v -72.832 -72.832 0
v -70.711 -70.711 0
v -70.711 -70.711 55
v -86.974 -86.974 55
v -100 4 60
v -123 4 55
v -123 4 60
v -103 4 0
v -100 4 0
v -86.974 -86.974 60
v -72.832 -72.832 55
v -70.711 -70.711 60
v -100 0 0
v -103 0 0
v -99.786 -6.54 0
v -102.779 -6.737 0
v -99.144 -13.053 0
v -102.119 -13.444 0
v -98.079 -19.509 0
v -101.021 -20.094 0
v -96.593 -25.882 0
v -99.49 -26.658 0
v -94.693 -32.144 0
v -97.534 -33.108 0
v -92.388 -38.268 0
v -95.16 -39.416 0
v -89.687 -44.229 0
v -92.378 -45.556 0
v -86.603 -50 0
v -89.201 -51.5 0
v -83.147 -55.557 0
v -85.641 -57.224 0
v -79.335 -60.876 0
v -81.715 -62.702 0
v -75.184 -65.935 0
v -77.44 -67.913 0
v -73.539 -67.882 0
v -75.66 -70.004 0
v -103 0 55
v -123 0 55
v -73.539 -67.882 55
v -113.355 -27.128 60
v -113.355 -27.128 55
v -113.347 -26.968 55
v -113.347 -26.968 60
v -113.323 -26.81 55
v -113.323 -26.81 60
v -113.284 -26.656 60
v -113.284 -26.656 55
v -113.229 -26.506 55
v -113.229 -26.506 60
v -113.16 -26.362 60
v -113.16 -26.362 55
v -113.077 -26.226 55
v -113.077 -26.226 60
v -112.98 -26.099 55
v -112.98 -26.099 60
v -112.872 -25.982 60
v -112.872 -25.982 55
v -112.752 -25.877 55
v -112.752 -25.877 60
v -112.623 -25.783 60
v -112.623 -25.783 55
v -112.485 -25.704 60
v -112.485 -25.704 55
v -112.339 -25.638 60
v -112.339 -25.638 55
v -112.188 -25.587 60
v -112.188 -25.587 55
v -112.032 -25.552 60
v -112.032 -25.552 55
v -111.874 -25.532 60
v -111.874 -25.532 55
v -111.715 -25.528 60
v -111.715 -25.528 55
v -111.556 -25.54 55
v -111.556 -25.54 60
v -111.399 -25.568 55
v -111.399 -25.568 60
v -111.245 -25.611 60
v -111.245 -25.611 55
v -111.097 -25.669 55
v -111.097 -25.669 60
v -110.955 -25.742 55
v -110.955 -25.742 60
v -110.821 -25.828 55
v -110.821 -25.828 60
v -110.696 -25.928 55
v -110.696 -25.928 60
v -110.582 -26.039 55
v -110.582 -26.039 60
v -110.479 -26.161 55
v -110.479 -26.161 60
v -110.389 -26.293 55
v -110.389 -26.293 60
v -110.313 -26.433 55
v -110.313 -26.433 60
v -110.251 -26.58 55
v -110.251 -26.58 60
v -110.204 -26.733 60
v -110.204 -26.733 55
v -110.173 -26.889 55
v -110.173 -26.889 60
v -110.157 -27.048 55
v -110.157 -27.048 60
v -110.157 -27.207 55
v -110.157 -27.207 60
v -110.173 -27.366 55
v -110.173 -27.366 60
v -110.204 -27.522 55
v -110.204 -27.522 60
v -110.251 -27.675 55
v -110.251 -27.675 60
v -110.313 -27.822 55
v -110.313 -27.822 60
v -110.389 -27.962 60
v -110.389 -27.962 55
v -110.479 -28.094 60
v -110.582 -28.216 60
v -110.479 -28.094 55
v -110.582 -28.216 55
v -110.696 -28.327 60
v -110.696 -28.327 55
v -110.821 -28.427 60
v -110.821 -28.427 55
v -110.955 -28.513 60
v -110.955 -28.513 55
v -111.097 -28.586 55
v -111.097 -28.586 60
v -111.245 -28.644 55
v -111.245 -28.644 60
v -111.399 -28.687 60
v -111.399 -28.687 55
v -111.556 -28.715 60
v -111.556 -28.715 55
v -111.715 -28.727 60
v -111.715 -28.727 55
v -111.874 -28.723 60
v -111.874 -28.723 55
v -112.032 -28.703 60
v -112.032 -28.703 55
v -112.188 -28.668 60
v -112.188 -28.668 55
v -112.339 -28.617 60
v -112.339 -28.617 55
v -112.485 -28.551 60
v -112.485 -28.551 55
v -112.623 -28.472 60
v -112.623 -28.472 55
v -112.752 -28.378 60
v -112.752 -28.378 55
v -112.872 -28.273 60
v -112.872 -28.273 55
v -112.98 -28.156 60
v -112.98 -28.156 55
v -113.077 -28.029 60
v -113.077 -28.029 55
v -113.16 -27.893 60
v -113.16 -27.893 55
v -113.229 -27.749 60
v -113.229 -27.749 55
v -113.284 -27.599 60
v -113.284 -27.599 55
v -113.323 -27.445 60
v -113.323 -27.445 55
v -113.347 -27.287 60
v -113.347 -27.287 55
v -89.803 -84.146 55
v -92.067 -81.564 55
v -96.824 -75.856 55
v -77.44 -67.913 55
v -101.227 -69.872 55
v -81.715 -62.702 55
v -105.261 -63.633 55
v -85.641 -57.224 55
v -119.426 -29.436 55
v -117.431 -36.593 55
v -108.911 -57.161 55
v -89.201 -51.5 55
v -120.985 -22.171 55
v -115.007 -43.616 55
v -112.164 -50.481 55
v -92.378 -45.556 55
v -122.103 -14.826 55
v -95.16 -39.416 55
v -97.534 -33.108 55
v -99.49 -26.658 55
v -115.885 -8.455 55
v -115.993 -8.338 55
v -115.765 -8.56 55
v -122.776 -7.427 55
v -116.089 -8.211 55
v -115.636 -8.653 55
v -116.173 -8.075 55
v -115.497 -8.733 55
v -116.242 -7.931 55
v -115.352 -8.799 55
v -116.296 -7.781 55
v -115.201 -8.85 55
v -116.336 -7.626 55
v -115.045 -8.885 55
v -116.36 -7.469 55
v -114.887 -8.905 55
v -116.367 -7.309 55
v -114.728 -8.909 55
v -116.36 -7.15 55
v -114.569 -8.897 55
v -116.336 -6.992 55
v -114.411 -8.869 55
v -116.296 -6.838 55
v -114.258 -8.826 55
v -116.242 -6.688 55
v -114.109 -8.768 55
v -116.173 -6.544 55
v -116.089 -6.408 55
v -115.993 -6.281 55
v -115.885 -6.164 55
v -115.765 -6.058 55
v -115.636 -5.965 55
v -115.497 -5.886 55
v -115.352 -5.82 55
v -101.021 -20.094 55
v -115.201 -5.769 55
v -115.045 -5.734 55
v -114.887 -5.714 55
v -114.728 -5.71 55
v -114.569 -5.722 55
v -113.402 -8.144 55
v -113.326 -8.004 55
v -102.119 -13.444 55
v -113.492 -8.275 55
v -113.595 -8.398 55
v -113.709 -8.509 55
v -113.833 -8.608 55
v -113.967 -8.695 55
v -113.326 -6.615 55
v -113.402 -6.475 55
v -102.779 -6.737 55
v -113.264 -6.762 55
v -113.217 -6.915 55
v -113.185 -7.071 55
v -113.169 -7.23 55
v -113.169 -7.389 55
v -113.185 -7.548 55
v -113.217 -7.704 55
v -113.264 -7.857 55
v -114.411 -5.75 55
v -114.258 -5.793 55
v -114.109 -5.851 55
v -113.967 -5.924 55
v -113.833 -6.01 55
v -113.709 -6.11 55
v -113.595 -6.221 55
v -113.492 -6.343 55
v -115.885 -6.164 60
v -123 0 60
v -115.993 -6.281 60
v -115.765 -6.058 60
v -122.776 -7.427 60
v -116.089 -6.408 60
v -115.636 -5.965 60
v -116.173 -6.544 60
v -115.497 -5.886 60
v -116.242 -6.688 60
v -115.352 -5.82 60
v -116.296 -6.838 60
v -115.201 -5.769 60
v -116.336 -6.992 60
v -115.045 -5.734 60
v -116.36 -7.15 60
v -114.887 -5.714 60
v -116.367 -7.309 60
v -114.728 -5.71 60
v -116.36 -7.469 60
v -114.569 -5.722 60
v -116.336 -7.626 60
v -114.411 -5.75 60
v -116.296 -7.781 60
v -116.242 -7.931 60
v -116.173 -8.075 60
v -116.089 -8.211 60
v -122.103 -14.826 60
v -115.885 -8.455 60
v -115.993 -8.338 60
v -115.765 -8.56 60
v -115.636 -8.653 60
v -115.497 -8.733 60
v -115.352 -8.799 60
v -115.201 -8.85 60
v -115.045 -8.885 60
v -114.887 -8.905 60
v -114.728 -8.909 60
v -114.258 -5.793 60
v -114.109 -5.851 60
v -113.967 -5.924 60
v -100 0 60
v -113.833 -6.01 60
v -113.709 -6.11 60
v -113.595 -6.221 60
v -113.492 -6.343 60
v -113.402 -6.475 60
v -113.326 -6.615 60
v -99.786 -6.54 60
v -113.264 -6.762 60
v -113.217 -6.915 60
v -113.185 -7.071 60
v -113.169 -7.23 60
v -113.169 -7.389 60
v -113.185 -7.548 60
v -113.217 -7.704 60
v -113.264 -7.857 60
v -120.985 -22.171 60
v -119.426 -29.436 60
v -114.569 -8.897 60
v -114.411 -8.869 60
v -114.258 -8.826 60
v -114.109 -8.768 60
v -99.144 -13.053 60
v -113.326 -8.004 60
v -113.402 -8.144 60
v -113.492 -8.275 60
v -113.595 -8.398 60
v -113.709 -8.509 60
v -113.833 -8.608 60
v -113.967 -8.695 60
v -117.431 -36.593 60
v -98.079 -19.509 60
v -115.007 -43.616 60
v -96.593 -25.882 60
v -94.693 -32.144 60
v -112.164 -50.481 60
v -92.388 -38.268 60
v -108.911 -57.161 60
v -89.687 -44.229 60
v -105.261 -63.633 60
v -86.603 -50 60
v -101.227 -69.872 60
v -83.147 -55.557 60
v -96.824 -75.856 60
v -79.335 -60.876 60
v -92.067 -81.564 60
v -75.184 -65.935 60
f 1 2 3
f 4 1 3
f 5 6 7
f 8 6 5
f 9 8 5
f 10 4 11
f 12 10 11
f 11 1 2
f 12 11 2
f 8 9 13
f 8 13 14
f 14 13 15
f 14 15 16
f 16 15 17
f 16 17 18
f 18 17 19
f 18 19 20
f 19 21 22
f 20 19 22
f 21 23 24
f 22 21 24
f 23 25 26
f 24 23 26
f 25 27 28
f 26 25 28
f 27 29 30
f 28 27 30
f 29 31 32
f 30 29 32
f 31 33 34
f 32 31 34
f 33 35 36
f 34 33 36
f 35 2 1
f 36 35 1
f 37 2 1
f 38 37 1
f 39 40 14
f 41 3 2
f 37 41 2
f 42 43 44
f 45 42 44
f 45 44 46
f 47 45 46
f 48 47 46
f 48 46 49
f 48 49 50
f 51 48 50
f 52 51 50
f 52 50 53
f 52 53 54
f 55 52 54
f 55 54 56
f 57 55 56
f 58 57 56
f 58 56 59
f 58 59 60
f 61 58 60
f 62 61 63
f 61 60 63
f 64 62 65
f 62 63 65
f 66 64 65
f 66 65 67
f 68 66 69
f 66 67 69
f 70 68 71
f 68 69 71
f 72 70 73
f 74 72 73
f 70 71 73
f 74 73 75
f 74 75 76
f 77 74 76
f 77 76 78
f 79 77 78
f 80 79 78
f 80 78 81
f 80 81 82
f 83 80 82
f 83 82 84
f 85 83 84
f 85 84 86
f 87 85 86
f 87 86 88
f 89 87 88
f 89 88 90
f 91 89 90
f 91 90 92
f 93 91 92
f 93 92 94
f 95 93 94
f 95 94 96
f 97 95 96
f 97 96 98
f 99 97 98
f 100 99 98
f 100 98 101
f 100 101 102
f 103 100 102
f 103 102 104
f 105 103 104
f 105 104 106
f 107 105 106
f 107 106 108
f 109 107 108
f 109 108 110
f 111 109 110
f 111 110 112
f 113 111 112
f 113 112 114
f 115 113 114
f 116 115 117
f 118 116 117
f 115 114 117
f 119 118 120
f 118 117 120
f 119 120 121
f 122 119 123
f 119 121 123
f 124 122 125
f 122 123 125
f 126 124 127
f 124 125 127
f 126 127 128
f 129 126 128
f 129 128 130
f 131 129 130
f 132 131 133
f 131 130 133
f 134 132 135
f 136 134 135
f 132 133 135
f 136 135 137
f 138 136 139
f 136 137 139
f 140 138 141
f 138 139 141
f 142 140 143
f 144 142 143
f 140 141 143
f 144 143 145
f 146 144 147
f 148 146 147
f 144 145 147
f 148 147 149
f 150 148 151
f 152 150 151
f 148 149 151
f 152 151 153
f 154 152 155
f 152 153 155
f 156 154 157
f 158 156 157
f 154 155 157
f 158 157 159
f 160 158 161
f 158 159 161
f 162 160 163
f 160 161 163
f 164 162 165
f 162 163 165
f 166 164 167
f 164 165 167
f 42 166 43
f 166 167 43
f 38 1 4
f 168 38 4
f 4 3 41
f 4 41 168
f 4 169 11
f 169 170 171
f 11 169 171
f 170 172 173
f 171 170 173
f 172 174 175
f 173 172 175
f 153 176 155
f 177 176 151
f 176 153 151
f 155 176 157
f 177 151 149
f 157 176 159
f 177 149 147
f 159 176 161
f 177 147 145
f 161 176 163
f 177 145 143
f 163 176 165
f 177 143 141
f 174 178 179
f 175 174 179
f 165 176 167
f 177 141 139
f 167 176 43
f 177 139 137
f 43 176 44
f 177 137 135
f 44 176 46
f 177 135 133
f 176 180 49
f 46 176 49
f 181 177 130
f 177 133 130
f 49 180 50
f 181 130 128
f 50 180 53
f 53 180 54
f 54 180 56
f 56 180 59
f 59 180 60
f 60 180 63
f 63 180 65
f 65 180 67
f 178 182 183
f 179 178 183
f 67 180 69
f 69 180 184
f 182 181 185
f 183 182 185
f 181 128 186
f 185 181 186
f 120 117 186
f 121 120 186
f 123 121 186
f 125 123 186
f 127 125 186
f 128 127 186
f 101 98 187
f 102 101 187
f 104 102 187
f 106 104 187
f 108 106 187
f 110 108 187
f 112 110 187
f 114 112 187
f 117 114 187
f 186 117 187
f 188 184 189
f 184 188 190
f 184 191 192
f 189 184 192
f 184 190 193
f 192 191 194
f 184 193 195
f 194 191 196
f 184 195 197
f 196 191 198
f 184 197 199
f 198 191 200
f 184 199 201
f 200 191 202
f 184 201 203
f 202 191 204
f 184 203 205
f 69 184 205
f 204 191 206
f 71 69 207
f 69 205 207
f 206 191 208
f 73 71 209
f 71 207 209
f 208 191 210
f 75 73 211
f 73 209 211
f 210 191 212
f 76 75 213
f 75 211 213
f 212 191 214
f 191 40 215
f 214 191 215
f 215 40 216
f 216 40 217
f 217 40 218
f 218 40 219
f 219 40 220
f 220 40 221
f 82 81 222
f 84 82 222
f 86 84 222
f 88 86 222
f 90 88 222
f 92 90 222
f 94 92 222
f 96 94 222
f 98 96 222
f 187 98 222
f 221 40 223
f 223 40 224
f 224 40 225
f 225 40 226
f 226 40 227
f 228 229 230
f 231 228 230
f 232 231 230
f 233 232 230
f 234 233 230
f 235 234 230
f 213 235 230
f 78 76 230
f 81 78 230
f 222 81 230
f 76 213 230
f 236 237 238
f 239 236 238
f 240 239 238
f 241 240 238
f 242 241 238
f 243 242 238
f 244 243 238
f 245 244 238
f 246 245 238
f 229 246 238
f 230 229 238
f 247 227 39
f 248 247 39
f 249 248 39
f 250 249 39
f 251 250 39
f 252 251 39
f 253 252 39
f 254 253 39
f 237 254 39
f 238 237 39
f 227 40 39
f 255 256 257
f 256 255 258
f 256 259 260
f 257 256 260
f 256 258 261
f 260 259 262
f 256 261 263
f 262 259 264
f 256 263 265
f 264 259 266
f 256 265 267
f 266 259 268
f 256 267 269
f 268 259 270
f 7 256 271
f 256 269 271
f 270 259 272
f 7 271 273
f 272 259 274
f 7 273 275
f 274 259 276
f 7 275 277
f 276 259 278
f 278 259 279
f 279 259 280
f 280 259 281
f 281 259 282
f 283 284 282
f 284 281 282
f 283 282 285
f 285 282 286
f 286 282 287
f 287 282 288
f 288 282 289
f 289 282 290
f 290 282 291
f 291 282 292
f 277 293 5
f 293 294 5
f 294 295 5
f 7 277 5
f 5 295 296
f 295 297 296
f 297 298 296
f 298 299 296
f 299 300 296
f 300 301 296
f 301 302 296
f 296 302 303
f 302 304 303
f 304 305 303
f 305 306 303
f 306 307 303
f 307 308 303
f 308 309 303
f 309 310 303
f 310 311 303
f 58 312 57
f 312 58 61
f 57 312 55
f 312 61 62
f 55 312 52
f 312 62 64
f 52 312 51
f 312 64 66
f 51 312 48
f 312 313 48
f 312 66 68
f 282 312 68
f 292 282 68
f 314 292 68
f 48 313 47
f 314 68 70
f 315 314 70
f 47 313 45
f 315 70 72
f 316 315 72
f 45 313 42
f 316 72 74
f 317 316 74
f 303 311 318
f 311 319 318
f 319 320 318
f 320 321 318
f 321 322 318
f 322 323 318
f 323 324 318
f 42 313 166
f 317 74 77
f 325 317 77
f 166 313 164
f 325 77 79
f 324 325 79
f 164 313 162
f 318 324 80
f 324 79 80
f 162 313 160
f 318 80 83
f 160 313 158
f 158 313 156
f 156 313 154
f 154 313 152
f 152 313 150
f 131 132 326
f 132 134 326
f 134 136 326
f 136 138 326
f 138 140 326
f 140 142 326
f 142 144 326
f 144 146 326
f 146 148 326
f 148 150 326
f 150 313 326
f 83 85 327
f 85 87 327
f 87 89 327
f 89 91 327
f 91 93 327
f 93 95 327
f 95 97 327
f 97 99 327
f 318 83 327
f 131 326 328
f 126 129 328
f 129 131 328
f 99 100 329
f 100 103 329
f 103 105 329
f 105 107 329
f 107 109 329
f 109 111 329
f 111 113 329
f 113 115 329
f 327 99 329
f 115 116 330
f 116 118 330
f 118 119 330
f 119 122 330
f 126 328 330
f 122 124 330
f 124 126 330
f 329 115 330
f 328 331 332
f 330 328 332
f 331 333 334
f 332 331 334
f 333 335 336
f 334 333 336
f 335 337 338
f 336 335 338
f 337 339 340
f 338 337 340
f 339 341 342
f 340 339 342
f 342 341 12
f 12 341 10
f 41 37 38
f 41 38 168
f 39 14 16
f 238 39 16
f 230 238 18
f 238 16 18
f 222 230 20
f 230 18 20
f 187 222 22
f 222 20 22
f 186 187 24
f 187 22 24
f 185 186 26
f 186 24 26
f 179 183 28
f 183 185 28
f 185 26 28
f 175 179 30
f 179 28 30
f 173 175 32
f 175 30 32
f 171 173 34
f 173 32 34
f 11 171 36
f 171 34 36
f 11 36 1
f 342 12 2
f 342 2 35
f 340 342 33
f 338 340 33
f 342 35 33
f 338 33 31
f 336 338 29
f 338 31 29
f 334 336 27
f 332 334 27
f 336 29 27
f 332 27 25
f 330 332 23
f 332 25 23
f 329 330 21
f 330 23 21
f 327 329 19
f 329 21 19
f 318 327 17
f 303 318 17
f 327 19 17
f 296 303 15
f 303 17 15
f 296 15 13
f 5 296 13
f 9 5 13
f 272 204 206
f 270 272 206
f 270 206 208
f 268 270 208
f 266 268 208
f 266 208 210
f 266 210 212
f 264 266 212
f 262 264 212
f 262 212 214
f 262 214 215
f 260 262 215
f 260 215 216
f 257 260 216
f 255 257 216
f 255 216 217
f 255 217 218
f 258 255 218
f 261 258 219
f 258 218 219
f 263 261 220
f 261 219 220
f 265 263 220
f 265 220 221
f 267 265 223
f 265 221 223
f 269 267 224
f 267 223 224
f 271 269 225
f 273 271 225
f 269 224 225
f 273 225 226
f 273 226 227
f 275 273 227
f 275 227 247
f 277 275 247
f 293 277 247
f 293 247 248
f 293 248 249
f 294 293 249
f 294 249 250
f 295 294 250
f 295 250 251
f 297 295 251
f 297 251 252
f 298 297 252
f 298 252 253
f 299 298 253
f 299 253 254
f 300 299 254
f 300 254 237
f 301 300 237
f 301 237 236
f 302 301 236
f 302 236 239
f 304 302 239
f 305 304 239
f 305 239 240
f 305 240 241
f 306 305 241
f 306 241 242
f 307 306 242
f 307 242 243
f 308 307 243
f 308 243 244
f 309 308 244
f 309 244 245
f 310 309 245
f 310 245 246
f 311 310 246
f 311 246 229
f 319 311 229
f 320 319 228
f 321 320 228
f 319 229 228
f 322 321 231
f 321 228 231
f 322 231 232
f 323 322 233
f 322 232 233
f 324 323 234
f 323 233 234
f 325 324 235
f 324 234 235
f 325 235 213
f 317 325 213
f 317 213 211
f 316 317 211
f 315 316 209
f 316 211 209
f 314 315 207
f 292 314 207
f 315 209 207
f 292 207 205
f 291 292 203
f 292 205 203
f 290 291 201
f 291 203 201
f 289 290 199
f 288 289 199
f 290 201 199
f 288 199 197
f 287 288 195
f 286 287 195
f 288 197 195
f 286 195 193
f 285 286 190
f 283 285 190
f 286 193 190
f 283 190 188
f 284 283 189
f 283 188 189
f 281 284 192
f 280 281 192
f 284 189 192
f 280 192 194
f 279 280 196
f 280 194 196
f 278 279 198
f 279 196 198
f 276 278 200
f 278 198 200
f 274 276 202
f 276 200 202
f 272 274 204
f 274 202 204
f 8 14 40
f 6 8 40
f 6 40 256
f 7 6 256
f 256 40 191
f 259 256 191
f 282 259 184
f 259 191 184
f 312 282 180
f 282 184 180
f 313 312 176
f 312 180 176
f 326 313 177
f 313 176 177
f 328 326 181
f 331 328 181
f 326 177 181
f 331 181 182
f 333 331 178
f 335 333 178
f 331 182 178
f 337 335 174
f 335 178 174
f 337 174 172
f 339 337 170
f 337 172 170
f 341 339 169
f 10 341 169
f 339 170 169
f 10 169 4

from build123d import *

# Parameters (mm, degrees)
EXTRUDE_1_DEPTH     = 60
EXTRUDE_START       = -5
EXTRUDE_2_DEPTH     = 5
SKETCH_4_R          = 1.6
CUT_EXTRUDE_1_DEPTH = 161.369884954
EXTRUDE_3_DEPTH     = 4
EXTRUDE_4_DEPTH     = 4


with BuildPart() as part:
    # 草图1 → 凸台-拉伸1 (new body)
    with BuildSketch(Plane.XY):
        with BuildLine():
            Line((-100, 0), (-103, 0))
            ThreePointArc((-103, 0), (-95.159591849, -39.416393534), (-72.831998462, -72.831998462))
            Line((-72.831998462, -72.831998462), (-70.710678119, -70.710678119))
            ThreePointArc((-70.710678119, -70.710678119), (-92.387953251, -38.268343237), (-100, 0))
        make_face()
    extrude(amount=EXTRUDE_1_DEPTH)

    # 草图2 → 凸台-拉伸2 (add)
    with BuildSketch(Plane.XY.offset(60).offset(EXTRUDE_START)):
        with BuildLine():
            Line((-103, 0), (-123, 0))
            ThreePointArc((-123, 0), (-113.637182499, -47.070062181), (-86.974134086, -86.974134086))
            Line((-86.974134086, -86.974134086), (-72.831998462, -72.831998462))
            ThreePointArc((-72.831998462, -72.831998462), (-95.159591849, -39.416393534), (-103, 0))
        make_face()
    extrude(amount=EXTRUDE_2_DEPTH)

    # 草图4 → 切除-拉伸1 (cut, through all)
    with BuildSketch(Plane(origin=(0, 0, 55), x_dir=(-1, 0, 0), z_dir=(0, 0, -1))):
        with Locations((111.754632886, -27.127514233)):
            Circle(SKETCH_4_R)
        with Locations((114.767472313, -7.30939799)):
            Circle(SKETCH_4_R)
    extrude(amount=-CUT_EXTRUDE_1_DEPTH, mode=Mode.SUBTRACT)

    # 草图7 → 凸台-拉伸4 (add)
    with BuildSketch(Plane(origin=(0, 0, 0), x_dir=(1, 0, 0), z_dir=(0, 1, 0))):
        Polygon((-103, 0), (-123, -55), (-123, -60), (-100, -60), (-100, 0), align=None)
    extrude(amount=EXTRUDE_4_DEPTH)


with BuildPart() as body_2:
    # 草图6 → 凸台-拉伸3 (new body)
    with BuildSketch(Plane(origin=(0, 0, 0), x_dir=(0, 0, -1), z_dir=(0.7071067811865477, -0.7071067811865475, 0))):
        Polygon((-55, -123), (-55, -103), (-55, -100), (0, -100), (0, -103), align=None)
    extrude(amount=-EXTRUDE_3_DEPTH)


solid = Compound([part.part, body_2.part])
